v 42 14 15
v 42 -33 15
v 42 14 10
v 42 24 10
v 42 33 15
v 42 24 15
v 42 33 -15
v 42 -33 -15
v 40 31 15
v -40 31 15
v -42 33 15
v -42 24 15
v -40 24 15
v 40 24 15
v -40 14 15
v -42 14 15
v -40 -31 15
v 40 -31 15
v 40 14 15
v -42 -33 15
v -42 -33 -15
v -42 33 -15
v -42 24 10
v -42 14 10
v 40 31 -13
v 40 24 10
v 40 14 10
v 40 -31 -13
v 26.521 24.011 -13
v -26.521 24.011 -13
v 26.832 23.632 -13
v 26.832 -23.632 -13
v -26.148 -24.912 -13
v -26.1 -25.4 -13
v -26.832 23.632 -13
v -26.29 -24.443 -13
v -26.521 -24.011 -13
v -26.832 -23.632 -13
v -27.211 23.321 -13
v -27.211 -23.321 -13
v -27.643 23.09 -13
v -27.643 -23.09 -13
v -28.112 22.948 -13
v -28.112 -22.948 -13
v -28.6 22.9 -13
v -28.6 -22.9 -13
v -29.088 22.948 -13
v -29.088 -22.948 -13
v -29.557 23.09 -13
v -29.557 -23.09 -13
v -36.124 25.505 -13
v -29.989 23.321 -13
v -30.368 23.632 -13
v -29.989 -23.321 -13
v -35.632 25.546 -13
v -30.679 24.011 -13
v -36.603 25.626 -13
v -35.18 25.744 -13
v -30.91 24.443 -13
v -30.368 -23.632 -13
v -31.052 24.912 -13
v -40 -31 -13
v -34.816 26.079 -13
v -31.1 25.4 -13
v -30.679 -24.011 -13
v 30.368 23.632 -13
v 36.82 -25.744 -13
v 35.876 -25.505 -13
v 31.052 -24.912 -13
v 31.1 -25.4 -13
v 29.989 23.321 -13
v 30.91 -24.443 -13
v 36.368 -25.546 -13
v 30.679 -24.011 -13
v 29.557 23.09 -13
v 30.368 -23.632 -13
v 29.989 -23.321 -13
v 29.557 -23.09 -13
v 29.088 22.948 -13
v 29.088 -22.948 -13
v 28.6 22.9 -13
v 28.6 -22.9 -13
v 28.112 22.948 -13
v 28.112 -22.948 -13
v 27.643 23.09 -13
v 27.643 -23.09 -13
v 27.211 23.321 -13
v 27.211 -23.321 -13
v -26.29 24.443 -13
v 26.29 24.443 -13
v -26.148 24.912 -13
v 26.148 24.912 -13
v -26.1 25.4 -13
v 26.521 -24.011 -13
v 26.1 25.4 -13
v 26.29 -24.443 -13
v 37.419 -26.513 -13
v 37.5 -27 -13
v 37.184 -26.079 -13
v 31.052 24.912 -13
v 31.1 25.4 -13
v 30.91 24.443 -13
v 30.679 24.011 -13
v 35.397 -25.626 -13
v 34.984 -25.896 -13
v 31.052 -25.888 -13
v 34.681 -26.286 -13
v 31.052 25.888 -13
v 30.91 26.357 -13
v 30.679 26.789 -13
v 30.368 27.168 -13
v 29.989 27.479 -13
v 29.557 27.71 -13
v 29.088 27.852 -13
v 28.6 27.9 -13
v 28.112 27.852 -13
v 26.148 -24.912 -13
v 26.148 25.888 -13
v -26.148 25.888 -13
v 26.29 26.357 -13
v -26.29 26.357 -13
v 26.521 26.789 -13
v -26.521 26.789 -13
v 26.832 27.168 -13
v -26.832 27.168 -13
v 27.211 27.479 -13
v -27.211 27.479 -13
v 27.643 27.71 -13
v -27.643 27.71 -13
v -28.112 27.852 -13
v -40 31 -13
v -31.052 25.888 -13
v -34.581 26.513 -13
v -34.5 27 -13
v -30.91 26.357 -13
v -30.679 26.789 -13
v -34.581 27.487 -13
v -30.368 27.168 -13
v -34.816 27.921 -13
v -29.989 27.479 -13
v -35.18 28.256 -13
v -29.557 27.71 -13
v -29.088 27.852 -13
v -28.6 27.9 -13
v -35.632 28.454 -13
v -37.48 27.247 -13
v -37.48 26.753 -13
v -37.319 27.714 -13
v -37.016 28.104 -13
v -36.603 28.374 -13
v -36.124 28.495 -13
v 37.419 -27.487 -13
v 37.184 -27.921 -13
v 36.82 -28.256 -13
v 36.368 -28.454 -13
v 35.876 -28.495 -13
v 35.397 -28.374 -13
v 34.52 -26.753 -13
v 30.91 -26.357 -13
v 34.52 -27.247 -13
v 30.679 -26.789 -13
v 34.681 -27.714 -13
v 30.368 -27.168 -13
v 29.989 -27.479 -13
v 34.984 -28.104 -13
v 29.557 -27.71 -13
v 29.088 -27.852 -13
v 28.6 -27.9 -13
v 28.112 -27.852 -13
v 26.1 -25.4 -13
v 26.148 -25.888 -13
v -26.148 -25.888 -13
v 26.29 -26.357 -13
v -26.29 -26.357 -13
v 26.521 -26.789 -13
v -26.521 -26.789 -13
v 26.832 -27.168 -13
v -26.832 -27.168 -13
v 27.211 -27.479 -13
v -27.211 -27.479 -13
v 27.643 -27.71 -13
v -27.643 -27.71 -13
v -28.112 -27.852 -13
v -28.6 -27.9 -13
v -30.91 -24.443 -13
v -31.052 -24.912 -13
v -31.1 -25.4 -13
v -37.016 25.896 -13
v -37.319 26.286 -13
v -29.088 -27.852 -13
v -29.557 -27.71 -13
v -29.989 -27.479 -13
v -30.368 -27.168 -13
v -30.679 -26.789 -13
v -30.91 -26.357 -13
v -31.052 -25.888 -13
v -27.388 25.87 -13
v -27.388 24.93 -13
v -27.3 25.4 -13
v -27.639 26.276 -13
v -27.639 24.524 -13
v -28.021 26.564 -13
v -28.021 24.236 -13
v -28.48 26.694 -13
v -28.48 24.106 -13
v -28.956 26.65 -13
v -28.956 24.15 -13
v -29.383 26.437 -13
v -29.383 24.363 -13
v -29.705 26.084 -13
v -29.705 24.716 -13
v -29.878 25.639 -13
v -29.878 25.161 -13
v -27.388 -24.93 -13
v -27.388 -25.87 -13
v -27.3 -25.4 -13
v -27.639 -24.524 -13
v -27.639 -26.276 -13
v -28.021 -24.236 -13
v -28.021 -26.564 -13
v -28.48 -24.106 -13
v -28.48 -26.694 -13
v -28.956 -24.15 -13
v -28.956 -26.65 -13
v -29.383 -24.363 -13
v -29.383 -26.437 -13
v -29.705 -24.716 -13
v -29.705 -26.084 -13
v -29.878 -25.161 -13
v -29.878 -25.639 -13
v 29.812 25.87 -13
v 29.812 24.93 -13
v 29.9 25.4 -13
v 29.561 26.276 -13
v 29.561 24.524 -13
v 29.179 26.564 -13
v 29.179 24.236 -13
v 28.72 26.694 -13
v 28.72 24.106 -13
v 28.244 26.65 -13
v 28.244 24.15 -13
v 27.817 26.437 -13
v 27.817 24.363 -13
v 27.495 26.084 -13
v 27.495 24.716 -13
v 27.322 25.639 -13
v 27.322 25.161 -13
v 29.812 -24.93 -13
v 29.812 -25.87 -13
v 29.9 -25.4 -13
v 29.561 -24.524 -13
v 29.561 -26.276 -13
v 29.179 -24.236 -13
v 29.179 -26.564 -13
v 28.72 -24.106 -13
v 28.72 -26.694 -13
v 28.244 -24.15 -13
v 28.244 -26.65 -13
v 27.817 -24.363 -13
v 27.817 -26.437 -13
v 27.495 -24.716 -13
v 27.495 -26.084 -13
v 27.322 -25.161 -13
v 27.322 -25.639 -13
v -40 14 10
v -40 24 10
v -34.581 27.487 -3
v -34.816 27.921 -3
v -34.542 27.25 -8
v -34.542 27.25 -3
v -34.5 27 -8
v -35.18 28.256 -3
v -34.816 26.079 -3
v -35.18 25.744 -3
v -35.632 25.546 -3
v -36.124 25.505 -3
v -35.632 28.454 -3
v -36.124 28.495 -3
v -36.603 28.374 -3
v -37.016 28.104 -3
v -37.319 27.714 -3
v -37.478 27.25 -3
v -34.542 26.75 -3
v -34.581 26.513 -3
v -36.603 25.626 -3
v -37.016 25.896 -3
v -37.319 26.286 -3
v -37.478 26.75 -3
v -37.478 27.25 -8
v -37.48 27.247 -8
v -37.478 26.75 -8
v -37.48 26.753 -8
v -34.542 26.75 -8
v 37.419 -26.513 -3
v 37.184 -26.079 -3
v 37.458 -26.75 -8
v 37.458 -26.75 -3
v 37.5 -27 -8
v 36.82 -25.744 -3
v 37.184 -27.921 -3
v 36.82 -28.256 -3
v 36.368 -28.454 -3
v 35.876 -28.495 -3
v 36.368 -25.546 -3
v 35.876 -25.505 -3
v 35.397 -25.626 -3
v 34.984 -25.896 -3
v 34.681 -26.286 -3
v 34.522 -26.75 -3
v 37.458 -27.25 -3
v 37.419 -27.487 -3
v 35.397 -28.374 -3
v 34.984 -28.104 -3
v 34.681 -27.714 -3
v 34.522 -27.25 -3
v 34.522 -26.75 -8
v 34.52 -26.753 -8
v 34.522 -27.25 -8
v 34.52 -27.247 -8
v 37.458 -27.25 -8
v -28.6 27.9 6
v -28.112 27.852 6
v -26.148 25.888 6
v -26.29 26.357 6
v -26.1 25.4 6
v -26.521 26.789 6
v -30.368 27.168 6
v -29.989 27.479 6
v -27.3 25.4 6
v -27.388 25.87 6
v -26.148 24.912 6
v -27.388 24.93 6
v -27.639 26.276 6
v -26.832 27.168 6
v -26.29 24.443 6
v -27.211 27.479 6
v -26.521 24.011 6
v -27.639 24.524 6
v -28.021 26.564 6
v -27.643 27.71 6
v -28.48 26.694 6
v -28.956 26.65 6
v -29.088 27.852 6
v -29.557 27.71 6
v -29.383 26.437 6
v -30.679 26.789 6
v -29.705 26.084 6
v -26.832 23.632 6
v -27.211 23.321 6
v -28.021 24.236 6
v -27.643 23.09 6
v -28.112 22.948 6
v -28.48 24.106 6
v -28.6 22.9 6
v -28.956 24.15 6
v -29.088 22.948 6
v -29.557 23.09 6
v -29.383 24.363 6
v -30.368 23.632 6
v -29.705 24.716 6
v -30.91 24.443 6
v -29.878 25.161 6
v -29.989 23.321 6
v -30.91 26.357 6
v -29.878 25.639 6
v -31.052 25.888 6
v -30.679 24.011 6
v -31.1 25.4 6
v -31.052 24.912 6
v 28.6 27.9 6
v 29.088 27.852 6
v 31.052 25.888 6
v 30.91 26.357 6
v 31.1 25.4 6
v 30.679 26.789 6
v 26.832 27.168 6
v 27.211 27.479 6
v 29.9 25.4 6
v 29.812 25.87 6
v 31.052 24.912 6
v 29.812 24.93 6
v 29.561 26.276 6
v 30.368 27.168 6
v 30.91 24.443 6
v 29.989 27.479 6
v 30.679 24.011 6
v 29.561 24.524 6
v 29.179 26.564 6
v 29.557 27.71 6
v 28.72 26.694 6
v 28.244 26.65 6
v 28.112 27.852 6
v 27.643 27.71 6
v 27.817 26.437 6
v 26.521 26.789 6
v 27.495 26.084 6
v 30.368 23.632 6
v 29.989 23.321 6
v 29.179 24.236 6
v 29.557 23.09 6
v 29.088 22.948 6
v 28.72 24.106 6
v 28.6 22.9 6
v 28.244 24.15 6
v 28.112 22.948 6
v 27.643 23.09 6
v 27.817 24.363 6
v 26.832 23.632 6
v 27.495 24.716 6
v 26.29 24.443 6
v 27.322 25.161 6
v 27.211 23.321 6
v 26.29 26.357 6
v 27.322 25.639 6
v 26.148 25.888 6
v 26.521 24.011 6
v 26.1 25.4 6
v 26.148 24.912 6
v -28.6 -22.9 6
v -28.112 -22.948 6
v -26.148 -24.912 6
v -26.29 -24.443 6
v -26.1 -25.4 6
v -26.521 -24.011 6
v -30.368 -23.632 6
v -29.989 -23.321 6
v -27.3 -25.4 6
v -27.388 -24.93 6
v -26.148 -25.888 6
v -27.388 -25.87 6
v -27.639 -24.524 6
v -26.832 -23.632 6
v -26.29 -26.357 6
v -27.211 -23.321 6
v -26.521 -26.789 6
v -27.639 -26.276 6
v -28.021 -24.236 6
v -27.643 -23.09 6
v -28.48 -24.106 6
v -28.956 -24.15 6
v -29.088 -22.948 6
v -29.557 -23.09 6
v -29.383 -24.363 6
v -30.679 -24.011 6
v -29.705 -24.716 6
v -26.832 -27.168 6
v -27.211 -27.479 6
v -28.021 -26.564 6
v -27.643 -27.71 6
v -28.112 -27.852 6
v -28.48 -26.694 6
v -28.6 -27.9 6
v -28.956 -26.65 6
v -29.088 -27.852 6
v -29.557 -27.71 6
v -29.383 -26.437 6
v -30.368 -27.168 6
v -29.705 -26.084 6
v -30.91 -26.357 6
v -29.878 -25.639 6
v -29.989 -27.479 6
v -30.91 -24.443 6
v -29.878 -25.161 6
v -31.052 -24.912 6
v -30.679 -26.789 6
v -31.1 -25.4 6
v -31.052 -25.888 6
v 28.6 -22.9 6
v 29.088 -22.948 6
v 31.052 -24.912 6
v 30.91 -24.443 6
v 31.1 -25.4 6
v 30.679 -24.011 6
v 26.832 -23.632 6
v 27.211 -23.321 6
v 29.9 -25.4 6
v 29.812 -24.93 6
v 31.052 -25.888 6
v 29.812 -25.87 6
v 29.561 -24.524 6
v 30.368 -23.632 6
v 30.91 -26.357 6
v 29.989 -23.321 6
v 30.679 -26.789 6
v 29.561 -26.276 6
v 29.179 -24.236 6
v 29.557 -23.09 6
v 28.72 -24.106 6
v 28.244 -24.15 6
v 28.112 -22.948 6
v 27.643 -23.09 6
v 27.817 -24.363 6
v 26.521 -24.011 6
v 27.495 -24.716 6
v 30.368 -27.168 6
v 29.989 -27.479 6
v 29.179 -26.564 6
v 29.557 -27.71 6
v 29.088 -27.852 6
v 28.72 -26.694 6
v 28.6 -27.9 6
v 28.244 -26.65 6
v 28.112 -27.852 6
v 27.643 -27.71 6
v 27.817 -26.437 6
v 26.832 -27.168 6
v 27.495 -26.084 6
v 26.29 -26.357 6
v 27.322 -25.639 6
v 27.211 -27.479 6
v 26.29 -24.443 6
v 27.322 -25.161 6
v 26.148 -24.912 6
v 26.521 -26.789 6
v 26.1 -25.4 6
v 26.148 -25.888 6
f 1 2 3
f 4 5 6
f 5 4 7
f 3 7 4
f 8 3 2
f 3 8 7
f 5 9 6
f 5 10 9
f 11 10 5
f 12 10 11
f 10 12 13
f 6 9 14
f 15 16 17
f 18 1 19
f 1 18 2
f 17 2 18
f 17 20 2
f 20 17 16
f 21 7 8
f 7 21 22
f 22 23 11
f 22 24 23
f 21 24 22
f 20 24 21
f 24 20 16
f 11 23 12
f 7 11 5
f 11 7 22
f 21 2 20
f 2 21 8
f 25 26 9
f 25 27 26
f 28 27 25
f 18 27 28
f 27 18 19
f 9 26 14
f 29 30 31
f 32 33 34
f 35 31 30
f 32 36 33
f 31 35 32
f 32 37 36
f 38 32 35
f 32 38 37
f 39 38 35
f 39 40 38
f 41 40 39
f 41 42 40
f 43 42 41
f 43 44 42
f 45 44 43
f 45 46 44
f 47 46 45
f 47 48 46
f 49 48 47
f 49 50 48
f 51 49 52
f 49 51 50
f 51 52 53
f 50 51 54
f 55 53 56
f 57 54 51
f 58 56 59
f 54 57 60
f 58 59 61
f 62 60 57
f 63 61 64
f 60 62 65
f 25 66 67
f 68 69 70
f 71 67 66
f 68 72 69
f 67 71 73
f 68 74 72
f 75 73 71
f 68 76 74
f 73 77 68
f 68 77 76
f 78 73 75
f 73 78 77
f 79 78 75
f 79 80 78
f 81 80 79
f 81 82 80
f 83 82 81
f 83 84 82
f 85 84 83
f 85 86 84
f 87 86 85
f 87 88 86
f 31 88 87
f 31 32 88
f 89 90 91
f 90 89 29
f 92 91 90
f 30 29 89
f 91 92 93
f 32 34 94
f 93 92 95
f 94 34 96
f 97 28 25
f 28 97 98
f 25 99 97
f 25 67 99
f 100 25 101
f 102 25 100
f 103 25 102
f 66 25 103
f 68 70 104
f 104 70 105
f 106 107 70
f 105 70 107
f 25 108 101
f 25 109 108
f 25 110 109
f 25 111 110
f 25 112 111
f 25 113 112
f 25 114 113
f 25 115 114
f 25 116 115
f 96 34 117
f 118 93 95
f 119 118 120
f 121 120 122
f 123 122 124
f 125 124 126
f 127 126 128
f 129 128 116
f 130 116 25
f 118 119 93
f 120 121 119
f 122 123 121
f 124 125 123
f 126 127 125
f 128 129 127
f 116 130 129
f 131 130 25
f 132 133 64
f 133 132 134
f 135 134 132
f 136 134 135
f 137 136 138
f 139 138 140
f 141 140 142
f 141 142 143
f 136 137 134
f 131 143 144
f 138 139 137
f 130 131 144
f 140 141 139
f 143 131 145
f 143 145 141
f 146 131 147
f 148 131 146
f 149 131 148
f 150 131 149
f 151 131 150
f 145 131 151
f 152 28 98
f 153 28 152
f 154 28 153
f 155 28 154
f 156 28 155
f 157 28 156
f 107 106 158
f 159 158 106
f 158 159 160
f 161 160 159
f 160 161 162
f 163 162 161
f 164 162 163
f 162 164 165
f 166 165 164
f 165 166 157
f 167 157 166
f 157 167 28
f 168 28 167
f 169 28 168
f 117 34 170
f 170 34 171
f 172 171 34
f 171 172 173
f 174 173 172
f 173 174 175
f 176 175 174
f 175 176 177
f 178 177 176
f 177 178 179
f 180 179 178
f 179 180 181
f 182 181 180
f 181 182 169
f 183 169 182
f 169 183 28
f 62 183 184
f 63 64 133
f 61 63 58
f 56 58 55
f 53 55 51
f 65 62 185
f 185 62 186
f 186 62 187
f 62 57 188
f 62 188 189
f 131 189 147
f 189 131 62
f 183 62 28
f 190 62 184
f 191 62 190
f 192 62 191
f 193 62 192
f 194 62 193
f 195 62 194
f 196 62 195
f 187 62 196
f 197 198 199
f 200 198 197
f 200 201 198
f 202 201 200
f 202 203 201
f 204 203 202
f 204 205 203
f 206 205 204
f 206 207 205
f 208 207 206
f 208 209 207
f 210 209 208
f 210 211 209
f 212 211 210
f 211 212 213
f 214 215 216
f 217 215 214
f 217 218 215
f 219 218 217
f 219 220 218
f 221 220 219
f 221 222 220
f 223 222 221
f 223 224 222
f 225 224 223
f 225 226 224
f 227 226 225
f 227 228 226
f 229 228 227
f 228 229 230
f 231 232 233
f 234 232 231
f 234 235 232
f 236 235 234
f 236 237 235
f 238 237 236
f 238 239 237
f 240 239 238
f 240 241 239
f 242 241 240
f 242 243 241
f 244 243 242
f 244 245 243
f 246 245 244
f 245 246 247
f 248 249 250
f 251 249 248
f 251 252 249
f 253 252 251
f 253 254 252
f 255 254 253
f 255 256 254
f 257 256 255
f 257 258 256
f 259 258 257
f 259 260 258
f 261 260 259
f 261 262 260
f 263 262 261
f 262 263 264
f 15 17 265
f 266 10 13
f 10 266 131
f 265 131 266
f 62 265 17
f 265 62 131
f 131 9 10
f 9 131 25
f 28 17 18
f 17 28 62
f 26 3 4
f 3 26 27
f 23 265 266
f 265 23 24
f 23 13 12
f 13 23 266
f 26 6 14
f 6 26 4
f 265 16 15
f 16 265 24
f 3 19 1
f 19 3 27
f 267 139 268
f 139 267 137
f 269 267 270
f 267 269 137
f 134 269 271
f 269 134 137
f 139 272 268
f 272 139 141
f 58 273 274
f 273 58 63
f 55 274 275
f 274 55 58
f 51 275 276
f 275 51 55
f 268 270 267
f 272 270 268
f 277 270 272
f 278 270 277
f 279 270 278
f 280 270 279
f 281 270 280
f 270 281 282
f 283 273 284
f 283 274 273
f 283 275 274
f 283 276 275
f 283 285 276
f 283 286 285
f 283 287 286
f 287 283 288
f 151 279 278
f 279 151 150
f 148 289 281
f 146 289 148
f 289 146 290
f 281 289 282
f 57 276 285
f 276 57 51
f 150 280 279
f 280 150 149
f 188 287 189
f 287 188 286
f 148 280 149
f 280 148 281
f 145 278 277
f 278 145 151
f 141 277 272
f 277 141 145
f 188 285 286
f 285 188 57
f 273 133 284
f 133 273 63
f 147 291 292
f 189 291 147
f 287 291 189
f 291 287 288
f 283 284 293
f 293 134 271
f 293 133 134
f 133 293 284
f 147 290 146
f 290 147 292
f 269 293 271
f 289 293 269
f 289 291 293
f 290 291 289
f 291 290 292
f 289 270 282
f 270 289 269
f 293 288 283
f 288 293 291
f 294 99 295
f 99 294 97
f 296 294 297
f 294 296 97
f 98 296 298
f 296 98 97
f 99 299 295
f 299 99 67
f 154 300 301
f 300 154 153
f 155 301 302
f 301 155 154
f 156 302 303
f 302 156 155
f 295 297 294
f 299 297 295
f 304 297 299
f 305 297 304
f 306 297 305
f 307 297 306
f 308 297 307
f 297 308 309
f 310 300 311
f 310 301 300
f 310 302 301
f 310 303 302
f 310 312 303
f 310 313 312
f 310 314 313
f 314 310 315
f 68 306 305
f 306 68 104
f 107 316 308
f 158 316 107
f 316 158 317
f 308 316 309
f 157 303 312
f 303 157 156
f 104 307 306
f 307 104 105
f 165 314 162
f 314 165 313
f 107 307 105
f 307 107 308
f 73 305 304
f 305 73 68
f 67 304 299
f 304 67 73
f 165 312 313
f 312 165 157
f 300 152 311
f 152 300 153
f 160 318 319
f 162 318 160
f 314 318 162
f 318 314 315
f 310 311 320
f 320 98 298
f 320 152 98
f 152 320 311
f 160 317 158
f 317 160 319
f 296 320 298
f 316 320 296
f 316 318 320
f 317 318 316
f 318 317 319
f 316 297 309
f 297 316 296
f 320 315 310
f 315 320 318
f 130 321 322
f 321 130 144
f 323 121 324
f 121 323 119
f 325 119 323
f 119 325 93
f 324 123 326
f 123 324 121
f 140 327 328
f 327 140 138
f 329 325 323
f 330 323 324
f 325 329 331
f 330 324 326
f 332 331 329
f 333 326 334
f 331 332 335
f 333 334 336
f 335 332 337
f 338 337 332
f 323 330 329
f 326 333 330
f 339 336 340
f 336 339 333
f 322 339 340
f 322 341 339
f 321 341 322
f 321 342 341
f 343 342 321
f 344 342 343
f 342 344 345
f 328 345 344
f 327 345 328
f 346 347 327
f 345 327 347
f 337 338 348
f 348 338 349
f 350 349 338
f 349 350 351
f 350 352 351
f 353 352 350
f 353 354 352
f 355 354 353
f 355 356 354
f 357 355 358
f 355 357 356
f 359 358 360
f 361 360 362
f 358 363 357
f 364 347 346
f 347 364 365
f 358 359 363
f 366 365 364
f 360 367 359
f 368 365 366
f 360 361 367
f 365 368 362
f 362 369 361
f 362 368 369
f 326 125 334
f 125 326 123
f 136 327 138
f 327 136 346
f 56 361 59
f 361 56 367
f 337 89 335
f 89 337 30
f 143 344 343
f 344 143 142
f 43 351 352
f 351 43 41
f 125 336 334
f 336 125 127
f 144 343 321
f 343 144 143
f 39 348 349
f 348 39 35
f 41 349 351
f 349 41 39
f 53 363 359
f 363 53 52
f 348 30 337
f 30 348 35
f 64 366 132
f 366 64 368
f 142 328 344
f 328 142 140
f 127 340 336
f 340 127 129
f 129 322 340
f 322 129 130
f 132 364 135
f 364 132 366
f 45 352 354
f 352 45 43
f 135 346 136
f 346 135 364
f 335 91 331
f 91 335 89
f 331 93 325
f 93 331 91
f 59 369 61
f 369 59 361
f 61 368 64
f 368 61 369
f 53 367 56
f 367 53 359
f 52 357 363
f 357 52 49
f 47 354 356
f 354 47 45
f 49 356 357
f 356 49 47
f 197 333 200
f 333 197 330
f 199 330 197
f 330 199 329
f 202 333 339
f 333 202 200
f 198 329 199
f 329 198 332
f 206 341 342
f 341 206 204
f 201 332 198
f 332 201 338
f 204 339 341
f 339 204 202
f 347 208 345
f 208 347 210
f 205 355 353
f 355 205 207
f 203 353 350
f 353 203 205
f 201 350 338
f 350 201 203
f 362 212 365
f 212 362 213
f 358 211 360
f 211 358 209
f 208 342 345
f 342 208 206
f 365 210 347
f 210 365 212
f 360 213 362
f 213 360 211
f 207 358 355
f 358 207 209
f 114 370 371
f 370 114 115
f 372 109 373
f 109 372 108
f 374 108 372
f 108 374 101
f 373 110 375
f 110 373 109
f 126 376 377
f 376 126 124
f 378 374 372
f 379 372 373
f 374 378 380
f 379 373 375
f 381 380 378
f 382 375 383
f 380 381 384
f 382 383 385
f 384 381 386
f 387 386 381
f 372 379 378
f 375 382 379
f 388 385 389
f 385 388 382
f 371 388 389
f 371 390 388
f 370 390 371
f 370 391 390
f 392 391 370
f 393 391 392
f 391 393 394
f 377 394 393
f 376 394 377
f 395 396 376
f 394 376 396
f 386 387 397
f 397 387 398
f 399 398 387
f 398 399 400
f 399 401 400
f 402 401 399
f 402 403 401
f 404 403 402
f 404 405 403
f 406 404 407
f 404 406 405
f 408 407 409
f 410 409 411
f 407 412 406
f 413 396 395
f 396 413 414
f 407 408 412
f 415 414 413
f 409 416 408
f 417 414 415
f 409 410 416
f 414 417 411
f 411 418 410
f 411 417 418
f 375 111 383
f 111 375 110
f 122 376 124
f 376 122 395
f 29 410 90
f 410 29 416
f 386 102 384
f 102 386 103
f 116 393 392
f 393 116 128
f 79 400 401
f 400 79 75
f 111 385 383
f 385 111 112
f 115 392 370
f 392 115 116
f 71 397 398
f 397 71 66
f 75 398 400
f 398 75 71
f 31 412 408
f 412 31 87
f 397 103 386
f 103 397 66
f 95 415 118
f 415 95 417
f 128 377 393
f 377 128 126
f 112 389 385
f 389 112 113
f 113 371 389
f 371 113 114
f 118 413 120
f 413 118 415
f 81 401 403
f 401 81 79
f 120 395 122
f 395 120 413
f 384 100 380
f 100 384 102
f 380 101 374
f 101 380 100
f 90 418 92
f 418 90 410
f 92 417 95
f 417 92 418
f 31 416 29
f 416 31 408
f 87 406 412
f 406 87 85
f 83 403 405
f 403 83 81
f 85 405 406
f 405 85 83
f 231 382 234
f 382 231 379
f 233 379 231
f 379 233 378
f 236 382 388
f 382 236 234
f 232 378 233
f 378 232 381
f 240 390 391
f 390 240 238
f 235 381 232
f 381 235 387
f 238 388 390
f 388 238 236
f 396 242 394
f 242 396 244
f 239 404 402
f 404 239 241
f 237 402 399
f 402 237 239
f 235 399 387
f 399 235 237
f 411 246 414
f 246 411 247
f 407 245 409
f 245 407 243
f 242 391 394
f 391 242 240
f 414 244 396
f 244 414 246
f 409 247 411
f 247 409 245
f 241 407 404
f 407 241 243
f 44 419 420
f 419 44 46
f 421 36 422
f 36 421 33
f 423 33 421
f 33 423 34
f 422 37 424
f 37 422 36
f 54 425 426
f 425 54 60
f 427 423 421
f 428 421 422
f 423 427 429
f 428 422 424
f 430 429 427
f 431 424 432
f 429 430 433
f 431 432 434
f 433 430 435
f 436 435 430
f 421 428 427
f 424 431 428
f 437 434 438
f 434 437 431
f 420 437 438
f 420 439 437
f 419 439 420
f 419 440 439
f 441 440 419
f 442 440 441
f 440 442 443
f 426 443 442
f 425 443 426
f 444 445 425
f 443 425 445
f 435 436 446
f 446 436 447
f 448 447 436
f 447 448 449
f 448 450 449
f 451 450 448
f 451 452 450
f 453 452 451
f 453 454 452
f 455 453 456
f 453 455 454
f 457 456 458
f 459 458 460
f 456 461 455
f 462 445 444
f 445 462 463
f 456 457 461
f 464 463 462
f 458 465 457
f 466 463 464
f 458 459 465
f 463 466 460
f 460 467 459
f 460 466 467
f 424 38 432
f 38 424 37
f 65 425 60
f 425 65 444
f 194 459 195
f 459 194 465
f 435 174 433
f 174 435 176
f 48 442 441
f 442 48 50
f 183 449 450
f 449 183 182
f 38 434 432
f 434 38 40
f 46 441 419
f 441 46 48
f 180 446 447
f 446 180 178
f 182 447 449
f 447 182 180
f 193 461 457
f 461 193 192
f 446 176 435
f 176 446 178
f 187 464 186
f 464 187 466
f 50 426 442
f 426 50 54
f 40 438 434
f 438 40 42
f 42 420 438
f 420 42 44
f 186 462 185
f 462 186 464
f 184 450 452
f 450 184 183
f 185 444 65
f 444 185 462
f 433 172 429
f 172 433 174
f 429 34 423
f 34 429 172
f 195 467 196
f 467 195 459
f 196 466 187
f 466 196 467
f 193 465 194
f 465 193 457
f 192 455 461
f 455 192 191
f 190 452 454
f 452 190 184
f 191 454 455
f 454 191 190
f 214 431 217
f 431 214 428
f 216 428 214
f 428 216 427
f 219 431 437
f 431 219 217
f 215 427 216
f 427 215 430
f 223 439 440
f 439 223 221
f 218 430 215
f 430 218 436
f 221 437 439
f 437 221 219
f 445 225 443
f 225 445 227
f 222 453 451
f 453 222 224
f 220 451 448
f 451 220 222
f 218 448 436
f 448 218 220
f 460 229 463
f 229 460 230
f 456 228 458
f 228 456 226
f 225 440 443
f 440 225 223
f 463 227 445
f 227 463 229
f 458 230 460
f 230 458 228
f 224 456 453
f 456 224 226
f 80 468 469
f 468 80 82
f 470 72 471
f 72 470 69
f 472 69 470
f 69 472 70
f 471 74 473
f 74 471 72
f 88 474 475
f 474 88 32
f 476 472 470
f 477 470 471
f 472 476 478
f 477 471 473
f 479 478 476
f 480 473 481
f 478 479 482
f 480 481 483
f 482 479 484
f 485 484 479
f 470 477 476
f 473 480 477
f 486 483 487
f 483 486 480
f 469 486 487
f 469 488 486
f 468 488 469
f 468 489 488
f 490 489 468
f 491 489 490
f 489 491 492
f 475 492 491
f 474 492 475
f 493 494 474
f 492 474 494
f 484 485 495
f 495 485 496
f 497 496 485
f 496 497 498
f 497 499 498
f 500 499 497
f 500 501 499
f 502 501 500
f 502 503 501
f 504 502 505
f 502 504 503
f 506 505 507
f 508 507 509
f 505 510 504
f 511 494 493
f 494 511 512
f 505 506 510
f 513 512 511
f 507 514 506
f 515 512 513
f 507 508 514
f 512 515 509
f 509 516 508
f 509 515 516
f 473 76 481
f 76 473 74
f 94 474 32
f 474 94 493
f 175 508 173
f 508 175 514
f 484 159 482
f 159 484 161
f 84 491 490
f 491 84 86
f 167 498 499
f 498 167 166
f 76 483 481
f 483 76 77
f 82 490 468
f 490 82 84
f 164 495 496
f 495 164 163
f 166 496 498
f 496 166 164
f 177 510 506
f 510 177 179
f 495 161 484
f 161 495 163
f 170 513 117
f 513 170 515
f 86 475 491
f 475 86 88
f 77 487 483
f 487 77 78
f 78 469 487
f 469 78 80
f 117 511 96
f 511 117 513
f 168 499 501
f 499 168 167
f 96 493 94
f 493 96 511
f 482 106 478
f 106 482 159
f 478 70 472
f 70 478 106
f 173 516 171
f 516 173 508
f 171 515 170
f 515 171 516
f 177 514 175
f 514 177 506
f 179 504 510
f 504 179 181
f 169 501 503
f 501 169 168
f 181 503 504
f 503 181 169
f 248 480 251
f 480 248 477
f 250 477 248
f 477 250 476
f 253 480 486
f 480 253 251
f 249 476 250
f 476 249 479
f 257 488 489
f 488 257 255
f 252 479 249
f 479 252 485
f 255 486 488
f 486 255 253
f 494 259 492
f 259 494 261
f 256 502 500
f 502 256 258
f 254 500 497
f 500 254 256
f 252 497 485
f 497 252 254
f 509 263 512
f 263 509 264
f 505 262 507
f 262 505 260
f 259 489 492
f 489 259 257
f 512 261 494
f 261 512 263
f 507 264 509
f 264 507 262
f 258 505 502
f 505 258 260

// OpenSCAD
$fa = 10;
$fs = 0.5;

module case_top(size, radius, thickness) {
    width = size[0];
    height = size[1];
    depth = size[2];
    
    difference() {
        cube([width, height, depth], center=true);
        translate([0, 0, thickness]) {
            // make case hollow
            cube([width - thickness * 2, height - thickness * 2, depth], center=true);
        }
    }
}

module pcb_column(height, innerHeight, outer, inner) {
    union() {
        translate([0, 0, 0]) {
            cylinder(h=height, r=outer, center=true);
            translate([0, 0, (innerHeight - height) / 2]) cylinder(h=innerHeight, r=inner, center=true);
        }
    }
}

module pcb_column(height, outer, inner) {
    difference() {
        cylinder(h=height, r=outer);
        cylinder(h=height, r=inner);
    }
}

module pcb_columns() {
    translate([-28.6, 25.4, 0]) pcb_column(19, 2.5, 1.3);
    translate([28.6, 25.4, 0]) pcb_column(19, 2.5, 1.3);
    translate([-28.6, -25.4, 0]) pcb_column(19, 2.5, 1.3);
    translate([28.6, -25.4, 0]) pcb_column(19, 2.5, 1.3);
}

module case_pin(height, r) {
    difference() {
        cylinder(h=height, r=r);
        translate([0, 0, height - 5 / 2]) cube([10, 0.5, 5], center=true);
    }
}

module case_pins() {
    translate([-36, 27, 0]) case_pin(10, 1.5);
    translate([36, -27, 0]) case_pin(10, 1.5);
}

module main() {
    union() {
        difference() {
            case_top([84, 66, 30], 3, 2);
            // Cut out for cables ...
            translate([0, 19, 12.5]) cube([84, 10, 5], center=true);
        }
        translate([0, 0, -13]) {
            case_pins();
            pcb_columns();
        }
        
    }
}

main();
